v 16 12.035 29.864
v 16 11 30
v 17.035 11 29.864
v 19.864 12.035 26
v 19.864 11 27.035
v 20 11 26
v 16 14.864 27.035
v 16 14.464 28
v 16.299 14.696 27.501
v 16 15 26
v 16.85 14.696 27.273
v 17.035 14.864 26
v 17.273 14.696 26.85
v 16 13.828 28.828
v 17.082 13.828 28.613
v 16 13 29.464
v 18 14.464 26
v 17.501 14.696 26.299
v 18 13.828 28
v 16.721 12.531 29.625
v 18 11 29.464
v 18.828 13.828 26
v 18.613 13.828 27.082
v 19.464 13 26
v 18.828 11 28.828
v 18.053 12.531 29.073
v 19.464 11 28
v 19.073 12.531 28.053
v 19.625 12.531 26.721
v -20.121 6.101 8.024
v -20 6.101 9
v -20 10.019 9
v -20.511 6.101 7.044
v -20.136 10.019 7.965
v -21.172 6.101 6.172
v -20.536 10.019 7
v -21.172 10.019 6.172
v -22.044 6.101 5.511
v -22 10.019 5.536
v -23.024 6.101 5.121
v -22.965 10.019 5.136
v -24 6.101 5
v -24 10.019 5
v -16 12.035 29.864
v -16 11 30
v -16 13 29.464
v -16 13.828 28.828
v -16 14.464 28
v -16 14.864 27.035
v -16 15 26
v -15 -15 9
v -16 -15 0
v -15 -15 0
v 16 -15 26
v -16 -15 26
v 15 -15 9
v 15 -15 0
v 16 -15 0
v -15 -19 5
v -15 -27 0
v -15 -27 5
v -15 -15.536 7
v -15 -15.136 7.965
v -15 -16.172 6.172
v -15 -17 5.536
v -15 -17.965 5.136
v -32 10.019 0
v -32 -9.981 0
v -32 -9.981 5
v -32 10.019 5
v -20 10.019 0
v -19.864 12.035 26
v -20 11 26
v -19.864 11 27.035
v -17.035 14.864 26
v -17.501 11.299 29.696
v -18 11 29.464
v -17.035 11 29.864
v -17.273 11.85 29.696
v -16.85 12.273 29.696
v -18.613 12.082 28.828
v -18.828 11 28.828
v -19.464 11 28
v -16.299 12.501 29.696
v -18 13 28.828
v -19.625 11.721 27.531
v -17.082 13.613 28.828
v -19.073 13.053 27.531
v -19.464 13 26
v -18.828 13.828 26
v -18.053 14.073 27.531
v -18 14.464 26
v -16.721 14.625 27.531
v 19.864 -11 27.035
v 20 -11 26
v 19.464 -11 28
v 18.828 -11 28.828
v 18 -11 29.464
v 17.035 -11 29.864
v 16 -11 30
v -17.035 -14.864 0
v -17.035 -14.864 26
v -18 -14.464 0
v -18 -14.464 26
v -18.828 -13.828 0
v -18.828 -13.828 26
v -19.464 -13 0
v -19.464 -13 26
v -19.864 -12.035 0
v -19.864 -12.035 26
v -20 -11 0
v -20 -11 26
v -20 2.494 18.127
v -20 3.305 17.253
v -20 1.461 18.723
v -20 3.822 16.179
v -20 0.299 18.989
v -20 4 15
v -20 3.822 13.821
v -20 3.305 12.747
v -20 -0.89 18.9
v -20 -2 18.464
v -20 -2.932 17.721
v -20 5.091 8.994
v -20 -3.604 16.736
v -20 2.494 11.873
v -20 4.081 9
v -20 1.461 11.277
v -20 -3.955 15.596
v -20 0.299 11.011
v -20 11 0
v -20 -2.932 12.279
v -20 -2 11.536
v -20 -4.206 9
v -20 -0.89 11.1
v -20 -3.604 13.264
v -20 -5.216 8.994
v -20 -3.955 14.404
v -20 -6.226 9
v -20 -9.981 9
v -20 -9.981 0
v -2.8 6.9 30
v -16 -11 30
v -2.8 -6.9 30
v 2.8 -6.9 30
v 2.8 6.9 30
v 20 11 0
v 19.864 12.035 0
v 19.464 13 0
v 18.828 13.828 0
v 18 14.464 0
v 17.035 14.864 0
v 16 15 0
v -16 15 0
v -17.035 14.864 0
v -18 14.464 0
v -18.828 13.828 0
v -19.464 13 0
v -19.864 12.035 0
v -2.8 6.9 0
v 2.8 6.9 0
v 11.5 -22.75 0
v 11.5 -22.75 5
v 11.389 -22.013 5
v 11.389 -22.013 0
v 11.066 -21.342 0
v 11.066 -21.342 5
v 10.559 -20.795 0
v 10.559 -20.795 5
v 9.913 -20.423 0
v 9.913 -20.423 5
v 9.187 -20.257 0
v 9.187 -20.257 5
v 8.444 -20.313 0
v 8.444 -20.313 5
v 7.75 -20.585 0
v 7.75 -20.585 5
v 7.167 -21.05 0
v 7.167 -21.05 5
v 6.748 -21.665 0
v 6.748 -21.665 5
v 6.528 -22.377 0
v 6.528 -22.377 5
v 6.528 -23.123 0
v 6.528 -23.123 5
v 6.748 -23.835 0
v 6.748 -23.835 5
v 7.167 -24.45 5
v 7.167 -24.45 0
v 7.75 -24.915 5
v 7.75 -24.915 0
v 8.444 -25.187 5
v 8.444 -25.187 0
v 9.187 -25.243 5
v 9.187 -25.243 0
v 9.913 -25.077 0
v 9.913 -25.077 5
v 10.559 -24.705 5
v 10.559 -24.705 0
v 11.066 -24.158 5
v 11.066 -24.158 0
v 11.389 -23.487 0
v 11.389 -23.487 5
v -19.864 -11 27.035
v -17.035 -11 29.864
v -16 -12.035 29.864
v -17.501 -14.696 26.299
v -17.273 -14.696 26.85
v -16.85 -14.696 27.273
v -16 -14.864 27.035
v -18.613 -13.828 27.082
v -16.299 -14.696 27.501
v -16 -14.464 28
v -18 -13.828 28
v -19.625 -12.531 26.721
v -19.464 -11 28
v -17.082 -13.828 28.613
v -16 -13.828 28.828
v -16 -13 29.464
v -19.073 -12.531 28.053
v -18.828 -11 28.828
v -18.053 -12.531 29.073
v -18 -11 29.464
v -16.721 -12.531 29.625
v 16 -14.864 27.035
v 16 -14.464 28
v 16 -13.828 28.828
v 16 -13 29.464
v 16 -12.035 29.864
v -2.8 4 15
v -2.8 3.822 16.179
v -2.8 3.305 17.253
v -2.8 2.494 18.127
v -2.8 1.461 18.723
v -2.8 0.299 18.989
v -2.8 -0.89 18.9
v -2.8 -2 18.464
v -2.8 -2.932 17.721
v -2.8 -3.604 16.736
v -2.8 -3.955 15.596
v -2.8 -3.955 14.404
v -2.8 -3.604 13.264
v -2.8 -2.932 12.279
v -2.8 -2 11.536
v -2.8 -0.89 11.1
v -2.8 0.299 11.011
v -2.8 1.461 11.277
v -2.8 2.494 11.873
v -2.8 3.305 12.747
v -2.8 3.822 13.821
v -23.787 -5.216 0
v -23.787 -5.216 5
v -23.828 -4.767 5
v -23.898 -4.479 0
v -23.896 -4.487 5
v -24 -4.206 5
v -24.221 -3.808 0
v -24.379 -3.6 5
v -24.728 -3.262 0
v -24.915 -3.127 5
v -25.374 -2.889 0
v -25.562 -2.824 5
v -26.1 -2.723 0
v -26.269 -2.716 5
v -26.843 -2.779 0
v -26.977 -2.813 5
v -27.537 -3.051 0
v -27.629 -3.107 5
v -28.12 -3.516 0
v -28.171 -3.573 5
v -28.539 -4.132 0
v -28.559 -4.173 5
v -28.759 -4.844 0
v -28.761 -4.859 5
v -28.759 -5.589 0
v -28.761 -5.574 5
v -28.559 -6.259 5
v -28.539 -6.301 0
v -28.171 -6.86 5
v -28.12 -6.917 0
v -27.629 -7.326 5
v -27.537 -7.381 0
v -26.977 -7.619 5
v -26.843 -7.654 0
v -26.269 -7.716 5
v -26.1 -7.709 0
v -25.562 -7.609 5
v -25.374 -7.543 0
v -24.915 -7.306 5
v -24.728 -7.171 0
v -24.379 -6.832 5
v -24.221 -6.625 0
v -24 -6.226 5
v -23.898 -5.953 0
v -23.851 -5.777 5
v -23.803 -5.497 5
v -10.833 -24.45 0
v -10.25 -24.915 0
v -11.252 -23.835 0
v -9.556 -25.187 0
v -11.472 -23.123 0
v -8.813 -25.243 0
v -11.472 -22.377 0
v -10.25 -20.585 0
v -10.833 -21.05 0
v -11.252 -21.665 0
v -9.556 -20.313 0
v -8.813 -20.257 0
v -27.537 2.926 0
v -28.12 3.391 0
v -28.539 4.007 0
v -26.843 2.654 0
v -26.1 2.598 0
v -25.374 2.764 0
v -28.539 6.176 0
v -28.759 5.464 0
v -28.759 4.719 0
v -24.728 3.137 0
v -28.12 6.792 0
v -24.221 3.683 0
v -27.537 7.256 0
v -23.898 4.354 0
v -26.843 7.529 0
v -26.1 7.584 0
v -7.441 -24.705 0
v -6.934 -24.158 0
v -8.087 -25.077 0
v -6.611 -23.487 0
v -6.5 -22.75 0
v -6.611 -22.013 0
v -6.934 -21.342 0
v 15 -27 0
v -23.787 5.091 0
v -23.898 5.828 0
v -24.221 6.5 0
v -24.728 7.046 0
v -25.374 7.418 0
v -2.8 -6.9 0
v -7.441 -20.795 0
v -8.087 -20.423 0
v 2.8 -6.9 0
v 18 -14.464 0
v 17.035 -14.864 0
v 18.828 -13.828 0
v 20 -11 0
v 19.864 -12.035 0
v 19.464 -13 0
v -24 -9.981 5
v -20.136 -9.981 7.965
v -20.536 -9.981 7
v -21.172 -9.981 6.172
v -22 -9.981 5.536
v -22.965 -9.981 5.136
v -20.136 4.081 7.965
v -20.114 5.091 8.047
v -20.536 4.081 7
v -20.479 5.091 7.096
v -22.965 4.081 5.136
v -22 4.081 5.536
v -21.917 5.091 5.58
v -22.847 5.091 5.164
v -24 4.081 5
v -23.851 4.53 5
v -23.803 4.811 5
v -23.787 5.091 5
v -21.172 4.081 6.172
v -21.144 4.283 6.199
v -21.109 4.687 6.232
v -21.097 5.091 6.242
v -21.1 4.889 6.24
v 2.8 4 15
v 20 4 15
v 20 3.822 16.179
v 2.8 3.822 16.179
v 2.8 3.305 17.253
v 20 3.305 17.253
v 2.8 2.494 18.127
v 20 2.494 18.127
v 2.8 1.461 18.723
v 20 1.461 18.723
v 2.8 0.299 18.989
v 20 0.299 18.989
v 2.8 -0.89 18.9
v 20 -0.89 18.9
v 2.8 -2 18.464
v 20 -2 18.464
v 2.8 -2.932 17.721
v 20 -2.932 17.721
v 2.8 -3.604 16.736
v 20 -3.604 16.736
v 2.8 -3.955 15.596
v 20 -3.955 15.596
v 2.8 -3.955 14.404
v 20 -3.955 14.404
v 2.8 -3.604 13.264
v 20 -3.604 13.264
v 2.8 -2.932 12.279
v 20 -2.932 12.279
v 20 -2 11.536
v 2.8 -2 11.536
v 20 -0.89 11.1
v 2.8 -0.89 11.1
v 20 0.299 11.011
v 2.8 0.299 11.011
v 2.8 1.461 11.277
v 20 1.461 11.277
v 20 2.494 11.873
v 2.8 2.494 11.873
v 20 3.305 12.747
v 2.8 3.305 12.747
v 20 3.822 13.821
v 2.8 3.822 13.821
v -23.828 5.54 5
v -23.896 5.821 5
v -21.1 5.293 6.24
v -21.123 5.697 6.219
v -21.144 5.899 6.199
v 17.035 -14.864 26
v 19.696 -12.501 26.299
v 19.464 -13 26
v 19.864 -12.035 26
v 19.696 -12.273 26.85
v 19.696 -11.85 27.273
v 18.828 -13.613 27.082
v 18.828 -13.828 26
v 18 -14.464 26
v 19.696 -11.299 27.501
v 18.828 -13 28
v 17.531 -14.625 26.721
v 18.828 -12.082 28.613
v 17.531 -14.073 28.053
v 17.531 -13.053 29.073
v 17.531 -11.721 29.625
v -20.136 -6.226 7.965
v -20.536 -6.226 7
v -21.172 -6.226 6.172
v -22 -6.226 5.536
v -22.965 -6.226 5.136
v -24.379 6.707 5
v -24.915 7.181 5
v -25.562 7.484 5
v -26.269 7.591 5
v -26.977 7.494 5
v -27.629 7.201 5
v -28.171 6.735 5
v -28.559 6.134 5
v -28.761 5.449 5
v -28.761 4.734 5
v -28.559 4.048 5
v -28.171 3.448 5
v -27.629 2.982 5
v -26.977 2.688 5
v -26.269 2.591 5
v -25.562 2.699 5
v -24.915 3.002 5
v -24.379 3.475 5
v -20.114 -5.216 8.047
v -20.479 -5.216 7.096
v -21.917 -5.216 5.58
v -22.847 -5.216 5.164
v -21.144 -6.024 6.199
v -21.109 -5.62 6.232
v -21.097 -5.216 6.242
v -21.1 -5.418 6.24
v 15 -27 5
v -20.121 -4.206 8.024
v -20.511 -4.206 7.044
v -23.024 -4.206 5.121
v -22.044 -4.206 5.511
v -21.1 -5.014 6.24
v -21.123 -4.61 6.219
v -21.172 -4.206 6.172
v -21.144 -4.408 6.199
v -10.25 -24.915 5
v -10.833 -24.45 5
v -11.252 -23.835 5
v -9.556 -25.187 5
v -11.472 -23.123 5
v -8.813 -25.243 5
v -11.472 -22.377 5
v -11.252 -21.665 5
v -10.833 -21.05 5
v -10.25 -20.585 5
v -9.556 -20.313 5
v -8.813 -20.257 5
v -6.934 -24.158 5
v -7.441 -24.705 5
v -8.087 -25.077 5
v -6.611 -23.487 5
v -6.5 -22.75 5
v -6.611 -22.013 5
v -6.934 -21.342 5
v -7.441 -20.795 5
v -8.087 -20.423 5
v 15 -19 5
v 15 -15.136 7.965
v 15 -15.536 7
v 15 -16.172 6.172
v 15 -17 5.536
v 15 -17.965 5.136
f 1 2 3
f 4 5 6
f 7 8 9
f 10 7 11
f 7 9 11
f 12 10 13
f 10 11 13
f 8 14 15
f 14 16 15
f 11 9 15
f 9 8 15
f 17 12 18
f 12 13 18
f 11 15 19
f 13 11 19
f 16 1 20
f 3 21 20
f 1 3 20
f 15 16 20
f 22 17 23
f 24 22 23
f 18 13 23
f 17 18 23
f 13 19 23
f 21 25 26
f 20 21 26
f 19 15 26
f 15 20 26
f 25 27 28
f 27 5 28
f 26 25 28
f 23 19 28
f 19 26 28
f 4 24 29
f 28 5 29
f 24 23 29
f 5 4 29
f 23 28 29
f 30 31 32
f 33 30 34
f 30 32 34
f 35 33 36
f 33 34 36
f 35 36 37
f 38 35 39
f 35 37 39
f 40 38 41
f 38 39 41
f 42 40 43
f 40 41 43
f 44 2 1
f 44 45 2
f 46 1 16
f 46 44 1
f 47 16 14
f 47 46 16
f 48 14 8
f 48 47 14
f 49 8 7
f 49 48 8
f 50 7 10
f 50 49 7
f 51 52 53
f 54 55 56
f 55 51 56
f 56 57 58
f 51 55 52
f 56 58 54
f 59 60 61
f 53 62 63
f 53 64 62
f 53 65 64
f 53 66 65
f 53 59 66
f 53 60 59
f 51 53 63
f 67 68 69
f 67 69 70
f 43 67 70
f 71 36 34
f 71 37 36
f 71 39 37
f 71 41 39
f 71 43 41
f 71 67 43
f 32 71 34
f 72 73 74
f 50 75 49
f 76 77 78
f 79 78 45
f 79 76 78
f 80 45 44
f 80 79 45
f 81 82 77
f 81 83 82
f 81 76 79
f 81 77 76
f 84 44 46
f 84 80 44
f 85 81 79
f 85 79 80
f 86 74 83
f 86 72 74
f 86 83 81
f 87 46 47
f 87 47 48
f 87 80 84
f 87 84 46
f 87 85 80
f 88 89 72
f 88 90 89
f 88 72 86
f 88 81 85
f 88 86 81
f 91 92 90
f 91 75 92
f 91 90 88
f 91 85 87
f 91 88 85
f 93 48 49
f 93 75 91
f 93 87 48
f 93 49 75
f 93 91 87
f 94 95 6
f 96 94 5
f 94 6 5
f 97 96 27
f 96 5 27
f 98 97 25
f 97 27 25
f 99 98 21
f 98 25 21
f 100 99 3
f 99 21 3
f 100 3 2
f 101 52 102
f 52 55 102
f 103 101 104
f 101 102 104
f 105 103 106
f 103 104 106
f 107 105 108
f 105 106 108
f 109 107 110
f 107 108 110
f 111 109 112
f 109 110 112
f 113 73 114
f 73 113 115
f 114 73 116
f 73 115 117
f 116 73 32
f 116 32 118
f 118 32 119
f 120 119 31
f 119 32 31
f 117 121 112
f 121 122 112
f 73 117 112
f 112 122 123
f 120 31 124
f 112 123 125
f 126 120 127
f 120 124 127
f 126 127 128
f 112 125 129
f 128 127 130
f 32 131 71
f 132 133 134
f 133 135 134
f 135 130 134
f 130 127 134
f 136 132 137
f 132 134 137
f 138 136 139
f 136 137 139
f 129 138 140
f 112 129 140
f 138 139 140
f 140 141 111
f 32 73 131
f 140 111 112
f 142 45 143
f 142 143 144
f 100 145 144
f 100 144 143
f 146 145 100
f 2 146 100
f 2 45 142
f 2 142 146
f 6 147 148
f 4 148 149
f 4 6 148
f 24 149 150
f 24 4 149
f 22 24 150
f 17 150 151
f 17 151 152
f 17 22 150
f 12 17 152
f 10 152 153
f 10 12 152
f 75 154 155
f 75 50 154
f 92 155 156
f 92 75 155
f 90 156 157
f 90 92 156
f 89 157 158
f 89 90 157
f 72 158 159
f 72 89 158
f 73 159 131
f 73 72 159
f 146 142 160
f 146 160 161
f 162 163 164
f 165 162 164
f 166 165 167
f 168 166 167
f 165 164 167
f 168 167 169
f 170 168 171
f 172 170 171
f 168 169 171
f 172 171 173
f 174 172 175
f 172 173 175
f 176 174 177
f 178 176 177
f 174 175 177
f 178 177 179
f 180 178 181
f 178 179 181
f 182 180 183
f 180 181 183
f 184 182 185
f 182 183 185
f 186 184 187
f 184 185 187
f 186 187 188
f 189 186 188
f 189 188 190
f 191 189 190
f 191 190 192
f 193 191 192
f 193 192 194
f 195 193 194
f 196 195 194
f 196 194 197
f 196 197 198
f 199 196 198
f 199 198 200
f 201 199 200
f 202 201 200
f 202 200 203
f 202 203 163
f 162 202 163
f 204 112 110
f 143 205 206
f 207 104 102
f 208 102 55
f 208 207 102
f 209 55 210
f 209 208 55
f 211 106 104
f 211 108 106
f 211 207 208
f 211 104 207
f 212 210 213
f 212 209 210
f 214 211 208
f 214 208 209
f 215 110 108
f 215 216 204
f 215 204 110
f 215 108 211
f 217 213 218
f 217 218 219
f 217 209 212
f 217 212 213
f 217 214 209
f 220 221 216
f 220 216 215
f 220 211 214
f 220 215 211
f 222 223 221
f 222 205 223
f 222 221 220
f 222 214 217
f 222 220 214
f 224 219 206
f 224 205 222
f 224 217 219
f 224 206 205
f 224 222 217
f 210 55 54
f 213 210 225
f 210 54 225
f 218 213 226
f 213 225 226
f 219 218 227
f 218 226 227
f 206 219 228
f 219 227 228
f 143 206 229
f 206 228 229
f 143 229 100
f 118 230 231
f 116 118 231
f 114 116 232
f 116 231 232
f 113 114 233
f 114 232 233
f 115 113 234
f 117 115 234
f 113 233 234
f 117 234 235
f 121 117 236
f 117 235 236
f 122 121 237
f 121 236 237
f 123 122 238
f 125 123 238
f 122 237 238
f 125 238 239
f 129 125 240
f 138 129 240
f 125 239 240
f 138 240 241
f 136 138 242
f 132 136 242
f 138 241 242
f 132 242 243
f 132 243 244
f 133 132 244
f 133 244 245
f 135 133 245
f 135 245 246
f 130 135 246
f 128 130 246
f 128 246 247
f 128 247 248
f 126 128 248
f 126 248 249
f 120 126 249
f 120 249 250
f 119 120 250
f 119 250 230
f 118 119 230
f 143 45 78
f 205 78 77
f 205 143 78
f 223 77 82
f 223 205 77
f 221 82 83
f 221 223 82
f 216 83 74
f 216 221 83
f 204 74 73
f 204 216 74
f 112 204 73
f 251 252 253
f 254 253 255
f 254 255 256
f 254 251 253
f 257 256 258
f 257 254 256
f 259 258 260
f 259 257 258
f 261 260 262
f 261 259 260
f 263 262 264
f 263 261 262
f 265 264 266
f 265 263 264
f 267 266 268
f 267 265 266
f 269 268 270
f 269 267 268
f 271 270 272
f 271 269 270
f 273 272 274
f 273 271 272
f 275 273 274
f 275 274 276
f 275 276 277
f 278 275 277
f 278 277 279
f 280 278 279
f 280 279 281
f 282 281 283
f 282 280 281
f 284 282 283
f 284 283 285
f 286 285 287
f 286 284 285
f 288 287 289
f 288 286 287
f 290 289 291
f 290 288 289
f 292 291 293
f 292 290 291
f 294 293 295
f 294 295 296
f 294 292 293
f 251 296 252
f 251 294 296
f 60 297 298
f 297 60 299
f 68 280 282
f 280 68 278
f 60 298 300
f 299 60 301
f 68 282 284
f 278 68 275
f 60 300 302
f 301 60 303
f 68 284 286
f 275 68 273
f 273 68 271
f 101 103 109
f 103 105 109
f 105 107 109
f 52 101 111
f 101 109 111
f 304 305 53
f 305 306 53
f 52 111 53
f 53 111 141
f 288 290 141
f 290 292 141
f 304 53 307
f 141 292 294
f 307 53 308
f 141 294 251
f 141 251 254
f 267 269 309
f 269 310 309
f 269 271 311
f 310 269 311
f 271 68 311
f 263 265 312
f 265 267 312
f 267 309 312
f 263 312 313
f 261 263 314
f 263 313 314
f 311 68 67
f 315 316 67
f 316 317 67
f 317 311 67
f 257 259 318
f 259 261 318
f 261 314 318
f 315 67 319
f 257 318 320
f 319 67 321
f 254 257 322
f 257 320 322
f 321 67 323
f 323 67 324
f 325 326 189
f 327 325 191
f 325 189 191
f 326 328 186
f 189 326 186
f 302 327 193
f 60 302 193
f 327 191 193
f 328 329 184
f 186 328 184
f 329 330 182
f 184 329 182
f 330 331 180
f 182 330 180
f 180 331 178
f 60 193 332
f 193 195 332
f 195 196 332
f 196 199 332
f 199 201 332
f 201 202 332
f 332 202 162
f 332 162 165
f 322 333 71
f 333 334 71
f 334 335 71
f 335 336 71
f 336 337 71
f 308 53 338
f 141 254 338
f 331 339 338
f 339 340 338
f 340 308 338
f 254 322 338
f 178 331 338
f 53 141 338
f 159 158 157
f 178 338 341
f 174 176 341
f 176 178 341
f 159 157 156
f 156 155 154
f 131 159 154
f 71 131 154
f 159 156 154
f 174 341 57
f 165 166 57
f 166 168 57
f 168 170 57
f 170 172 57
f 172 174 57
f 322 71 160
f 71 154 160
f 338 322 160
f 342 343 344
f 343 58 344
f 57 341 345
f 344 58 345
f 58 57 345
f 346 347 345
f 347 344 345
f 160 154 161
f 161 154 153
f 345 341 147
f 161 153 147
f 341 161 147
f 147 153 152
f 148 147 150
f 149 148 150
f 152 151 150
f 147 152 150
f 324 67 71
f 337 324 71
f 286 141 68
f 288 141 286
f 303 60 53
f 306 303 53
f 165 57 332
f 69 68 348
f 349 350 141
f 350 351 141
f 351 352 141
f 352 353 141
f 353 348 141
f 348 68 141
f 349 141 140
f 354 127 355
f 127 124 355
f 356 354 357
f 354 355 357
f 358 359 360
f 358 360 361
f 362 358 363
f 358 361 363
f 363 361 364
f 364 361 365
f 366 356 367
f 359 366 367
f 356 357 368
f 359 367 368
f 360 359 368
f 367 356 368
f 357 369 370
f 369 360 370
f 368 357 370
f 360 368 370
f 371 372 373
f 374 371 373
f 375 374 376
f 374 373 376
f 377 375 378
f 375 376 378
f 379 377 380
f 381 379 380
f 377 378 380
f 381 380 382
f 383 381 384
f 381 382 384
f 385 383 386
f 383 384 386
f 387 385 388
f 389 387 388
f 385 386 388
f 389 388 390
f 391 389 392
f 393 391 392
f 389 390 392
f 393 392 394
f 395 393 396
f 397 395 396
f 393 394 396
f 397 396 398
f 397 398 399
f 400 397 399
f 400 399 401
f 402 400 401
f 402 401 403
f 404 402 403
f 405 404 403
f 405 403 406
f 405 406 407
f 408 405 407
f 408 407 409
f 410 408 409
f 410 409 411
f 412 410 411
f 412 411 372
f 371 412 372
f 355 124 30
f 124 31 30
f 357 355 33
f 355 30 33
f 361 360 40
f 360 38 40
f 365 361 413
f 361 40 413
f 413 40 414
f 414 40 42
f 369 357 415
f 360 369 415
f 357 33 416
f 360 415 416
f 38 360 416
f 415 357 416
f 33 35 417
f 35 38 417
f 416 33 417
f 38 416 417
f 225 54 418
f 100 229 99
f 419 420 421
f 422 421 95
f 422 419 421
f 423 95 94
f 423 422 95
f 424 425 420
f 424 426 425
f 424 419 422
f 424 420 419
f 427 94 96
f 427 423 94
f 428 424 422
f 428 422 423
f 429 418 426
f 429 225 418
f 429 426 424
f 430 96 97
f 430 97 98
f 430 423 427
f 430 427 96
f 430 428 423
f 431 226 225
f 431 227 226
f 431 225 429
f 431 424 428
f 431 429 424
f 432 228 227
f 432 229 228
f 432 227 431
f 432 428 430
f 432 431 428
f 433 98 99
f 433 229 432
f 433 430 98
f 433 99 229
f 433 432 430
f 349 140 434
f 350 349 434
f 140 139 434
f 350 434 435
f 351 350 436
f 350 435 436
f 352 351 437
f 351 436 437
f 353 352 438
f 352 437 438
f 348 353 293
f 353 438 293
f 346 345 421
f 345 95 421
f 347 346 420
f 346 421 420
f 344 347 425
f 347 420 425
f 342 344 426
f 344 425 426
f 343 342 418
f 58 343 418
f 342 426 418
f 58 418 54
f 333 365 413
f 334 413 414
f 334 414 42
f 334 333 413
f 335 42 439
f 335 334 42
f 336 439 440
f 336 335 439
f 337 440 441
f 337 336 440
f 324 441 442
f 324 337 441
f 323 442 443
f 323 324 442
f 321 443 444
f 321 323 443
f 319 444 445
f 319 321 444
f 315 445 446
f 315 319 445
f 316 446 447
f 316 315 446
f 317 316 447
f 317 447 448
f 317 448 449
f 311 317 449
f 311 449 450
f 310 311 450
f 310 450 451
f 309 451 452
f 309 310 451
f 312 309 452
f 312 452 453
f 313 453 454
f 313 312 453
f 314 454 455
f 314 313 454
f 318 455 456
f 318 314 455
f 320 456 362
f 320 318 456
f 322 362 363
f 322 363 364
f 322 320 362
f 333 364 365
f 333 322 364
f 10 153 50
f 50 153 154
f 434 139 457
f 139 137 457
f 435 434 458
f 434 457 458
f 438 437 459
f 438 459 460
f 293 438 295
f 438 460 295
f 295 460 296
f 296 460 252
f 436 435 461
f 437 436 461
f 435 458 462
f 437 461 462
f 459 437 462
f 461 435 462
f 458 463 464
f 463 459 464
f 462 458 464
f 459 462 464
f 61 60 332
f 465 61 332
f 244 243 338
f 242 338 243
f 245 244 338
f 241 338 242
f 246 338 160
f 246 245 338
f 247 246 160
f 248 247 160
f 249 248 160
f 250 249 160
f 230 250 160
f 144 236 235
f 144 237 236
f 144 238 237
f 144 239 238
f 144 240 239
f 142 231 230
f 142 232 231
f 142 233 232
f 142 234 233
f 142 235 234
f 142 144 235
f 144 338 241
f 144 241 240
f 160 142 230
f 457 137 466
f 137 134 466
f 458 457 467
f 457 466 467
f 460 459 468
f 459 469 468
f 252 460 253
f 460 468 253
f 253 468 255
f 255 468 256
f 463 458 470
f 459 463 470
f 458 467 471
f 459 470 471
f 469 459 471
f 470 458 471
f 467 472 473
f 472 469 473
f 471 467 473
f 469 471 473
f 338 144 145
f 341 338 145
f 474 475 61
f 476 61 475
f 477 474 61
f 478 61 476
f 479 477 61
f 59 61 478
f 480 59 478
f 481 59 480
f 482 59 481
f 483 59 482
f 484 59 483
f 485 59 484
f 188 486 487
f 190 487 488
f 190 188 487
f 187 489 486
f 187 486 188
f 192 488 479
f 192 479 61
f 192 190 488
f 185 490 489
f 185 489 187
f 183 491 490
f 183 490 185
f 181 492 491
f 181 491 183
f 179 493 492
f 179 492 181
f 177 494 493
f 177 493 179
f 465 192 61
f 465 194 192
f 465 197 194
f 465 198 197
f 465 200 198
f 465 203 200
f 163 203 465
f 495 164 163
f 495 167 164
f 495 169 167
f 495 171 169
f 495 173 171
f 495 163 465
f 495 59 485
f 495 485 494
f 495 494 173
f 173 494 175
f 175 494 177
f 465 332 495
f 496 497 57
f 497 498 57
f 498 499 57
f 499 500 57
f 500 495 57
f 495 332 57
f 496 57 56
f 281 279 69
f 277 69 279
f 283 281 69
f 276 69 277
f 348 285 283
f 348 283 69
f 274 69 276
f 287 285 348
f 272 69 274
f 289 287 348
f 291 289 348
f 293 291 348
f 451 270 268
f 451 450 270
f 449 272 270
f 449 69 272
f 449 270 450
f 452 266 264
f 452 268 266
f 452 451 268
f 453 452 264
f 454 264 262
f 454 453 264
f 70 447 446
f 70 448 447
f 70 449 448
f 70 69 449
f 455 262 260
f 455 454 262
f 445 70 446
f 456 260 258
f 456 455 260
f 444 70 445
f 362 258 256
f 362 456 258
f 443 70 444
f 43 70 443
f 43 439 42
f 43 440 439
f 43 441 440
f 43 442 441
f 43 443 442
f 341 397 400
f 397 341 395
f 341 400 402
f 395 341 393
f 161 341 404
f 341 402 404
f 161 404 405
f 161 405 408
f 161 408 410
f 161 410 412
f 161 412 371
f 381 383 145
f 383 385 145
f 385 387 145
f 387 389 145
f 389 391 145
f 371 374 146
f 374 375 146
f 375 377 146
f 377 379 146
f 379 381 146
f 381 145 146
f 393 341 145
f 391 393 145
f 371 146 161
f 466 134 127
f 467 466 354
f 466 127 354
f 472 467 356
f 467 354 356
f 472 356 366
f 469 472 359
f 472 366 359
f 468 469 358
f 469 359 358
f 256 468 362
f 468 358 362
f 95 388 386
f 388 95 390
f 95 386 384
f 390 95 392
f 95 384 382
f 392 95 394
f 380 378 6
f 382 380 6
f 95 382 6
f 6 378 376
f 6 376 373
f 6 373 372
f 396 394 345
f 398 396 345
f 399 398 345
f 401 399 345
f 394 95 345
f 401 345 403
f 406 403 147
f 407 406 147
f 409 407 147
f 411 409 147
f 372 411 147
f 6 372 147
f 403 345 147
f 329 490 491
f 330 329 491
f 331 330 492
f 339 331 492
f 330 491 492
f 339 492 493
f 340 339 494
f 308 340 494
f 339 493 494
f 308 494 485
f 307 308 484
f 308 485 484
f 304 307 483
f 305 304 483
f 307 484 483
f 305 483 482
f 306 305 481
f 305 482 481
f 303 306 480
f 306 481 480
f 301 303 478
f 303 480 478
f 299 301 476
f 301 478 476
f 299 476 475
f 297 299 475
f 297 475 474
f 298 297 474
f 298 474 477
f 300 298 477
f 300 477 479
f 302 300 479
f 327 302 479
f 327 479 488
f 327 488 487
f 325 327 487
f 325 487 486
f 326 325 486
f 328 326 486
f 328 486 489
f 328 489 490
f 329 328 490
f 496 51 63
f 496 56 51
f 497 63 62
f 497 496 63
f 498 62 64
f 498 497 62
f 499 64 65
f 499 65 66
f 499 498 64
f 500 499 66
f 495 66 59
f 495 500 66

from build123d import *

# Parameters (mm, degrees)
F1_DEPTH = 30
F0_W     = 30
F0_H     = 12
F2_DEPTH = 5
F3_R     = 4
F4_DEPTH = 40.001
F5_R     = 2.5
F6_DEPTH = 5.001
F7_W     = 5.6
F7_H     = 13.8
F8_DEPTH = 30.001
F0_W_2   = 12
F0_H_2   = 20
F0_R     = 2.5
F9_DEPTH = 5
F10_R    = 4


# Not quite as in the source:
# - a feature names something its author has since deleted; it is built from what else it names


with BuildPart() as f1:
    # F0 (on Top) → F1 (new body)
    with BuildSketch(Plane.XY):
        Polygon((15, -15), (20, -15), (20, 15), (-20, 15), (-20, 10.0191985071), (-20, -9.9808014929), (-20, -15), (-15, -15), align=None)
    extrude(amount=F1_DEPTH)

    # F0 (on Top) → F2 (join)
    with BuildSketch(Plane.XY):
        with Locations((0, -21)):
            Rectangle(F0_W, F0_H)
    extrude(amount=F2_DEPTH)

    # F3 (on face) → F4 (cut, through all)
    with BuildSketch(Plane.YZ.offset(20)):
        with Locations((0, 15)):
            Circle(F3_R)
    extrude(amount=-F4_DEPTH, mode=Mode.SUBTRACT)

    # F5 (on face) → F6 (cut, through all)
    with BuildSketch(Plane.XY.offset(5)):
        with Locations((9, -22.75)):
            Circle(F5_R)
        with Locations((-9, -22.75)):
            Circle(F5_R)
    extrude(amount=-F6_DEPTH, mode=Mode.SUBTRACT)

    # F7 (on face) → F8 (cut, through all)
    with BuildSketch(Plane.XY.offset(30)):
        Rectangle(F7_W, F7_H)
    extrude(amount=-F8_DEPTH, mode=Mode.SUBTRACT)

    # F0 (on Top) → F9 (join)
    with BuildSketch(Plane.XY):
        with Locations((-26, 0.0191985071)):
            Rectangle(F0_W_2, F0_H_2)
        with Locations((-26.2869596481, -5.2162762731)):
            Circle(F0_R, mode=Mode.SUBTRACT)
        with Locations((-26.2869596481, 5.0912299193)):
            Circle(F0_R, mode=Mode.SUBTRACT)
    extrude(amount=F9_DEPTH)

    # F10
    f10_edges = [f1.edges().sort_by_distance(p)[0] for p in [
        (-20, 0.019199, 5),
        (-20, 15, 15),
        (-20, 0, 30),
        (-20, -15, 15),
        (0, -15, 5),
        (0, -15, 30),
        (20, -15, 15),
        (20, 0, 30),
        (0, 15, 30),
        (20, 15, 15),
    ]]
    fillet(f10_edges, radius=F10_R)


solid = f1.part
